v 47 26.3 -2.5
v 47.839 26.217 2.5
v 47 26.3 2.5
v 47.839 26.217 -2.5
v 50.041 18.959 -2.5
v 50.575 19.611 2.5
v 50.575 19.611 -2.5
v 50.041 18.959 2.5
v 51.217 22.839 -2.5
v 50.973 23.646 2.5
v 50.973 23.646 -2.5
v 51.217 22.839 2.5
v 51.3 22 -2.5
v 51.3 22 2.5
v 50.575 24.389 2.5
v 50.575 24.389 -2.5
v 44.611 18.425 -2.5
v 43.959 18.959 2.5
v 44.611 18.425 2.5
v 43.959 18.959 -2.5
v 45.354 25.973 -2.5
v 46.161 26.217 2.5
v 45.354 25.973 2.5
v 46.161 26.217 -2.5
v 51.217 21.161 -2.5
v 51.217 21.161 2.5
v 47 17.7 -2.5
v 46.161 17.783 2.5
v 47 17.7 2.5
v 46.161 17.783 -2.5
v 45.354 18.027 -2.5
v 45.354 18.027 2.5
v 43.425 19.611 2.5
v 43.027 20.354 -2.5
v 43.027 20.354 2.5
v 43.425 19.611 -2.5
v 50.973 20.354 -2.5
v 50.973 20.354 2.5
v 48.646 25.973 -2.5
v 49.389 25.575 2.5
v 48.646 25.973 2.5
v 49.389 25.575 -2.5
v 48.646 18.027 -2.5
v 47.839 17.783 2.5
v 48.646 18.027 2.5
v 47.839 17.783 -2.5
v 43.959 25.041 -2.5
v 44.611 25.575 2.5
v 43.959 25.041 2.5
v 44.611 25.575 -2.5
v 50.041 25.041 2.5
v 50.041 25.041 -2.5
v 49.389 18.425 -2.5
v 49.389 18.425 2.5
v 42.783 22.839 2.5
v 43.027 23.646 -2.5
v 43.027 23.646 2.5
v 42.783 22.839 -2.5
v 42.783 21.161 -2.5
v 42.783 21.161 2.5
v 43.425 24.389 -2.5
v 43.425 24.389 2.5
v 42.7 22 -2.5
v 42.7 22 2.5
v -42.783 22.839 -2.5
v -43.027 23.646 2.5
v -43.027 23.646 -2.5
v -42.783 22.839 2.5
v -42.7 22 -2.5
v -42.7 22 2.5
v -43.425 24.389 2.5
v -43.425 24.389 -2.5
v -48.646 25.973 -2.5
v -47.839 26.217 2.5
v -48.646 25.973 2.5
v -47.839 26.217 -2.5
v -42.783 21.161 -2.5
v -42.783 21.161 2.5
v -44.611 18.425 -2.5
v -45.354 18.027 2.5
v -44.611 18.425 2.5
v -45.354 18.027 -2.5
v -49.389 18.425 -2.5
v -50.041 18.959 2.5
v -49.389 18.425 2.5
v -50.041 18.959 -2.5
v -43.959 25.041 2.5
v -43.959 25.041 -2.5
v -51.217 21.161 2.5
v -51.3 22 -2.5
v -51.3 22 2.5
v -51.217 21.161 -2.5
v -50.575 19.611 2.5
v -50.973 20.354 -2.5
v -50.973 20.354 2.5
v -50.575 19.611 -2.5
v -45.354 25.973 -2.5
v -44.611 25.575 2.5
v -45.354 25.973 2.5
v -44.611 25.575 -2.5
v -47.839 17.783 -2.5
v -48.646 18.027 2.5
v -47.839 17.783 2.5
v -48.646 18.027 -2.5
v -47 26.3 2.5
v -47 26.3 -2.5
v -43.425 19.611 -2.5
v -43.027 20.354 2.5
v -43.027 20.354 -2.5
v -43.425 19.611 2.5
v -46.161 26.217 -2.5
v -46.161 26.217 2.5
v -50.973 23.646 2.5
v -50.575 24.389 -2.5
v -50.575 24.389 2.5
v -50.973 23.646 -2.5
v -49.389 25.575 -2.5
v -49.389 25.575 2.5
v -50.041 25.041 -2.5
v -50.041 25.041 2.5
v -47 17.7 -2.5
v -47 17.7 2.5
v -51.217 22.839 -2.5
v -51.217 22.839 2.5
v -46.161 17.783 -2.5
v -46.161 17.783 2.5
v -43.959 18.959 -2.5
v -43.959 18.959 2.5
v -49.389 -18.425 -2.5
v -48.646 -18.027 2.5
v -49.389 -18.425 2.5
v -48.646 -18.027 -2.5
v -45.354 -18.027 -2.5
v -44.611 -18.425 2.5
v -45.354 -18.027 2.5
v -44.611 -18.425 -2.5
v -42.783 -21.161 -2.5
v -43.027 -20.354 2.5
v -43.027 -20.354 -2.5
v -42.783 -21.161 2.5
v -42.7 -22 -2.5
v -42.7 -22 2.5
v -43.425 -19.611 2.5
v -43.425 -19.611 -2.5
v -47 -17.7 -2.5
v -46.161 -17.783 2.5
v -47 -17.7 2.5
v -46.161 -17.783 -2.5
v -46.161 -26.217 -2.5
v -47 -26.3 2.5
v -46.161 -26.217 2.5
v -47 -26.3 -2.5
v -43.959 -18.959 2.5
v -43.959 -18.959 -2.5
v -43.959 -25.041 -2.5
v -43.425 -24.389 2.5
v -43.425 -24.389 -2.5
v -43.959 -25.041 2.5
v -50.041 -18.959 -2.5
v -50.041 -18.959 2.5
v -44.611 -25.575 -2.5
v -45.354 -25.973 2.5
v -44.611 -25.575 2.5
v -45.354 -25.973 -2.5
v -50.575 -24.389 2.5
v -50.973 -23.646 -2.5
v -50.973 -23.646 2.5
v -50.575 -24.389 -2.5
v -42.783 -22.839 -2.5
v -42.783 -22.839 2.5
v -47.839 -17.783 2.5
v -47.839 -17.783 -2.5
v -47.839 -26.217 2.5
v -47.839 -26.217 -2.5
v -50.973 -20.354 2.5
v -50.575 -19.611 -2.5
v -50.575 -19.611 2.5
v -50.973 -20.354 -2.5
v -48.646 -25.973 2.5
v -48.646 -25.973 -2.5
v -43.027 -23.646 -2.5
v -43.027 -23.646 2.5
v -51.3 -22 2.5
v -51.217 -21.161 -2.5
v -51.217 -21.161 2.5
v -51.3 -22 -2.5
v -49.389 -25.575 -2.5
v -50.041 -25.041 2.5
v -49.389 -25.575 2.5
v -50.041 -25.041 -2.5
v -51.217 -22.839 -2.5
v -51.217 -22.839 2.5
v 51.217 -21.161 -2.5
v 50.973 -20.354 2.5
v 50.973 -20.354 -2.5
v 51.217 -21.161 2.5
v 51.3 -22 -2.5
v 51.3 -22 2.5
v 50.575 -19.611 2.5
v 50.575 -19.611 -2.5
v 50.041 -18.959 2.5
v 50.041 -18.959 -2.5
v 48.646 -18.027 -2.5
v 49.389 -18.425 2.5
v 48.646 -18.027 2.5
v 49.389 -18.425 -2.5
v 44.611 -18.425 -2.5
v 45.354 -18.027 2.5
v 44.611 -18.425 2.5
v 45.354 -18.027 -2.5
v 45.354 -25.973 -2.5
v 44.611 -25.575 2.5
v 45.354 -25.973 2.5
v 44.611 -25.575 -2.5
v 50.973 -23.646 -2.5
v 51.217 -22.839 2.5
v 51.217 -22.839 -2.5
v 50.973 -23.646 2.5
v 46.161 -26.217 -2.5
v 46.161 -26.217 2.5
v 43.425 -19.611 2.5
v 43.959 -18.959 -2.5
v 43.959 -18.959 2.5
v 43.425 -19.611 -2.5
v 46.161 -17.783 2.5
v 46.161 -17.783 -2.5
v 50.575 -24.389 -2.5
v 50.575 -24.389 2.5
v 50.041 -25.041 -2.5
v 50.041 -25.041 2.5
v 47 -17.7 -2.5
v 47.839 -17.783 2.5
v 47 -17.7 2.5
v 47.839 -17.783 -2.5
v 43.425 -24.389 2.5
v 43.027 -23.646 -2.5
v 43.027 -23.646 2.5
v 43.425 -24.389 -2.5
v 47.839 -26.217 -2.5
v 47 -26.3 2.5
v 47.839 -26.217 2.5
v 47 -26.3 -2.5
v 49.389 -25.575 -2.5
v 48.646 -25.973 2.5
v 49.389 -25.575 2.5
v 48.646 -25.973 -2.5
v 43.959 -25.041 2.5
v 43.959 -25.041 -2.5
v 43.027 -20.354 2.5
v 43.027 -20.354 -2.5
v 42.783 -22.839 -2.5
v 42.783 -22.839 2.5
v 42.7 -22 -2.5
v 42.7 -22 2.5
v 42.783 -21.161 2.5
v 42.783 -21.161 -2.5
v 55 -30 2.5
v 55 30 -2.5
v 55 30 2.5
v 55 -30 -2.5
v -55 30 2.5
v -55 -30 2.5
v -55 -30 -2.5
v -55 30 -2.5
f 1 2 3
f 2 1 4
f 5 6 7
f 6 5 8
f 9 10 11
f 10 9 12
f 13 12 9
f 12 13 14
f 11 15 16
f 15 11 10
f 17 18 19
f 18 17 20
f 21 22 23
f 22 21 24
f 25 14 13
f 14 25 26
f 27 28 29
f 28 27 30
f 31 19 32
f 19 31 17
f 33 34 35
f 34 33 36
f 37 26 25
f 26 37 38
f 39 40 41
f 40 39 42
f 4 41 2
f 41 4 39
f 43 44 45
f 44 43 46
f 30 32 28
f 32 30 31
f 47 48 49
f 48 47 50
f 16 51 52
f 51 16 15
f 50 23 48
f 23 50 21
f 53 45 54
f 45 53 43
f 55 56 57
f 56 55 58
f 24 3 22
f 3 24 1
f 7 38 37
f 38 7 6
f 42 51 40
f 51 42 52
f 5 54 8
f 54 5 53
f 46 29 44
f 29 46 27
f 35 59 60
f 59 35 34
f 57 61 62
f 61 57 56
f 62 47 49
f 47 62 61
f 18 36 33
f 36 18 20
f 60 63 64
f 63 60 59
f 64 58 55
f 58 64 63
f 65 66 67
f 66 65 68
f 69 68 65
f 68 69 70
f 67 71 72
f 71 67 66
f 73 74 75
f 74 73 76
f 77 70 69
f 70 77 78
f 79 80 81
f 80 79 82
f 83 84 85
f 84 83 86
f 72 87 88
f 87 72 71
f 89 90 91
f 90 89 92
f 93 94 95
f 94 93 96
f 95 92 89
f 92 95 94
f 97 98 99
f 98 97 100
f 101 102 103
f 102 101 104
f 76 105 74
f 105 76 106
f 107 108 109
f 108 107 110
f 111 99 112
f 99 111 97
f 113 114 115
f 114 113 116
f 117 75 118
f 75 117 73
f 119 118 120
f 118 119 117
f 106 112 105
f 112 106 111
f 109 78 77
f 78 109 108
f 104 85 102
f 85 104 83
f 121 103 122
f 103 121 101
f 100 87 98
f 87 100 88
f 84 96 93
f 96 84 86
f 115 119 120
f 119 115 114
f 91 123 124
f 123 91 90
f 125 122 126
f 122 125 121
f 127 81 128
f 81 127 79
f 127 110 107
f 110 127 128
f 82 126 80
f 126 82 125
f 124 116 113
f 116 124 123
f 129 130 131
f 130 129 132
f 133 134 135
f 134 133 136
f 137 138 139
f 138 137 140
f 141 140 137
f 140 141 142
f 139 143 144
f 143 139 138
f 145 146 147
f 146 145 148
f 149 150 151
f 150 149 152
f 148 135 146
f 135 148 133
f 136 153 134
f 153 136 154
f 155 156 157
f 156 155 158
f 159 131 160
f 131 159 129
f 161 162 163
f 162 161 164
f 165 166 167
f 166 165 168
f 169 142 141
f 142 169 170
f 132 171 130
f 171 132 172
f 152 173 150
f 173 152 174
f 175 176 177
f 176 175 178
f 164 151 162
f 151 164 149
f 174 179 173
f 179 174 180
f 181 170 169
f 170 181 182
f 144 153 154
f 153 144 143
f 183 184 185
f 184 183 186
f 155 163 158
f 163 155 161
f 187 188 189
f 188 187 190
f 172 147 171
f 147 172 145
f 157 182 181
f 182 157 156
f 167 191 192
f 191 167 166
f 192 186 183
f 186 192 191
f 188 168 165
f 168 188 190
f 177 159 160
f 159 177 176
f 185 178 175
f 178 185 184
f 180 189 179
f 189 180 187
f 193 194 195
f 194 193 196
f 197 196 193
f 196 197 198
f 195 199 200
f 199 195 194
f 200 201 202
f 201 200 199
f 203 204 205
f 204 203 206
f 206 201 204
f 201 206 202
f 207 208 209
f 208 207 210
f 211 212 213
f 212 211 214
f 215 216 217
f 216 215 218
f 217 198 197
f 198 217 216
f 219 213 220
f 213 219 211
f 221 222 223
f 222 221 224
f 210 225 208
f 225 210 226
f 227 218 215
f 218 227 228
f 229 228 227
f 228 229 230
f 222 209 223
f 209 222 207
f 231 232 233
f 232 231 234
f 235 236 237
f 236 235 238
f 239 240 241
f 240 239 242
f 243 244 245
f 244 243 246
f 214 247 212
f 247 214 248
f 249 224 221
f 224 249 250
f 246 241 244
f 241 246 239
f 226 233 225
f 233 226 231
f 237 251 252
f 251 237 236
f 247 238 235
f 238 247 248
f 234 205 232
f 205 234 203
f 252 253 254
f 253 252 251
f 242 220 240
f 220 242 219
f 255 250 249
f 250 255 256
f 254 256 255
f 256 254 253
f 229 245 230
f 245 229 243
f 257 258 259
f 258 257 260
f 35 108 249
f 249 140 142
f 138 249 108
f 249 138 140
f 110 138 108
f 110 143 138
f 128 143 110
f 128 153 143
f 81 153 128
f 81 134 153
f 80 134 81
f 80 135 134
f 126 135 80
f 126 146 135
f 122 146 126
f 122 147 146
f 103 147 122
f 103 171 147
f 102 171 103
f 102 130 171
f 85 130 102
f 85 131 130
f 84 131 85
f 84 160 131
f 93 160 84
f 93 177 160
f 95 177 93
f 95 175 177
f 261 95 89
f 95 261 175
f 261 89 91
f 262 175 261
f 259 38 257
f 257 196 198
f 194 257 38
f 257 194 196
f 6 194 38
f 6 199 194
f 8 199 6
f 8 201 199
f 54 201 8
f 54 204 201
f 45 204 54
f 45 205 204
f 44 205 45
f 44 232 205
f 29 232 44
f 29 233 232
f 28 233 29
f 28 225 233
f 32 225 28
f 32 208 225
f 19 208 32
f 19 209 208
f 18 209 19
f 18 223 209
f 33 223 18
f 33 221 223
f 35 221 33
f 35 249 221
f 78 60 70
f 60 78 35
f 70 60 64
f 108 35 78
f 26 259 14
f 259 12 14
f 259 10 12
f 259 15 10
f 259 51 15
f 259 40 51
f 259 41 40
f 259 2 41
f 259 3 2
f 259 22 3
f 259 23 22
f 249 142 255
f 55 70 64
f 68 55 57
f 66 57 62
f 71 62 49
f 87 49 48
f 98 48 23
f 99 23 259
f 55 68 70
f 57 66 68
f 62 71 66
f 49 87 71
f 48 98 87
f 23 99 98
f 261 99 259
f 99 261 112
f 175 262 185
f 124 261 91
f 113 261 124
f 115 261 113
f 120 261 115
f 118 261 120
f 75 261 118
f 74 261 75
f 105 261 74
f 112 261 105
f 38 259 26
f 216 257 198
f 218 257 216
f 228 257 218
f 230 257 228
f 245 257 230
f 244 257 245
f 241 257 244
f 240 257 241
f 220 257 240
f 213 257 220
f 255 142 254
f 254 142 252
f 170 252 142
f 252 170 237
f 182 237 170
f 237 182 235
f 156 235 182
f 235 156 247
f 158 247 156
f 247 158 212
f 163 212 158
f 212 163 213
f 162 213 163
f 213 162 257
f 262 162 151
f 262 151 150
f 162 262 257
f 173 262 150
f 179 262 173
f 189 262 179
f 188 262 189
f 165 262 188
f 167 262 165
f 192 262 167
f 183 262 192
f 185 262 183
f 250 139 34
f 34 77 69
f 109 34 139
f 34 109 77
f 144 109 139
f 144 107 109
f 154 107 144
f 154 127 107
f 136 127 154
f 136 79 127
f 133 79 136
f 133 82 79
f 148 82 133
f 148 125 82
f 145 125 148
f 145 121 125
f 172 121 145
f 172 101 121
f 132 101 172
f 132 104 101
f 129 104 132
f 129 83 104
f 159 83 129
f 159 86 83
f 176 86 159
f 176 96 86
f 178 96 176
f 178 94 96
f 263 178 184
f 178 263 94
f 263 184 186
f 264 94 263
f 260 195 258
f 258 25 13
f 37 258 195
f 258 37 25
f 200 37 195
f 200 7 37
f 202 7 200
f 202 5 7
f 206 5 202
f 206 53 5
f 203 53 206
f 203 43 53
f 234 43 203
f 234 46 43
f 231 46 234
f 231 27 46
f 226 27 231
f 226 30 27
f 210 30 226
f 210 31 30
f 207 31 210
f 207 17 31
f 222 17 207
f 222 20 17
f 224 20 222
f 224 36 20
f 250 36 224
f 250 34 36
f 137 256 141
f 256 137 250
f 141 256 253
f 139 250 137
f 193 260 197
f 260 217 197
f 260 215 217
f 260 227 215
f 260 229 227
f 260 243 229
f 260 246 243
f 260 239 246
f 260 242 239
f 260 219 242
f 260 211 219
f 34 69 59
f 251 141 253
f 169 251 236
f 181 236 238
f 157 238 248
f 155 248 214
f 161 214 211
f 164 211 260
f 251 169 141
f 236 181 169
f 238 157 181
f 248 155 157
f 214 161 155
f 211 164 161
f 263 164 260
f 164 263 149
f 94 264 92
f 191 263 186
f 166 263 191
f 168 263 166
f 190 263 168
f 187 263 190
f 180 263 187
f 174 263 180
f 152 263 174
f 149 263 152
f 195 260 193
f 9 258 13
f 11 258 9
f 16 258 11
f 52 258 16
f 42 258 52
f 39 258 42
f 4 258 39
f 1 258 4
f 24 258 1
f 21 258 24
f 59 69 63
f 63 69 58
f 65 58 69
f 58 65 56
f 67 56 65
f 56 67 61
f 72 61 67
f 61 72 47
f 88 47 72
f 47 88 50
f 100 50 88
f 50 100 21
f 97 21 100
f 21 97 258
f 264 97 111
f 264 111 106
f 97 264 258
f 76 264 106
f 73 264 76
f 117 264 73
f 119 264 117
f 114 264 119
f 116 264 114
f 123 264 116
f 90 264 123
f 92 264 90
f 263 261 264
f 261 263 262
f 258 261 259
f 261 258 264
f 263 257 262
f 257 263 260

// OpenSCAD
$fn = 32;

// ----------------------------------------------------------------------
// Corner plate 110 x 60 x 5
// 4 holes, centres taken from the edge offset
// ----------------------------------------------------------------------

// --- parameters (mm) ---
plate = [110, 60, 5];   // overall size (x, y, z)
holes = 4;              // number of holes the drawing asks for
bore_d = 8.4;           // nominal hole diameter from the drawing
print_allowance = 0.2;  // clearance added for printing
edge = 8;               // hole centre offset from the plate edge

// --- derived feature positions (mm) ---
hole_d = bore_d + print_allowance;  // = 8.6   hole diameter as printed
corner_x = plate[0] / 2 - edge;     // = 47   corner hole X
corner_y = plate[1] / 2 - edge;     // = 22   corner hole Y
feature_centers = [
  [corner_x, corner_y],
  [-corner_x, corner_y],
  [-corner_x, -corner_y],
  [corner_x, -corner_y]
];   // hole centres the loop below drills

// plate outline, every hole drilled through with the same cutters
difference() {
  cube(plate, center = true);
  for (centre = feature_centers)
    translate([centre[0], centre[1], 0])
      cylinder(d = hole_d, h = plate[2] + 2, center = true);
}
